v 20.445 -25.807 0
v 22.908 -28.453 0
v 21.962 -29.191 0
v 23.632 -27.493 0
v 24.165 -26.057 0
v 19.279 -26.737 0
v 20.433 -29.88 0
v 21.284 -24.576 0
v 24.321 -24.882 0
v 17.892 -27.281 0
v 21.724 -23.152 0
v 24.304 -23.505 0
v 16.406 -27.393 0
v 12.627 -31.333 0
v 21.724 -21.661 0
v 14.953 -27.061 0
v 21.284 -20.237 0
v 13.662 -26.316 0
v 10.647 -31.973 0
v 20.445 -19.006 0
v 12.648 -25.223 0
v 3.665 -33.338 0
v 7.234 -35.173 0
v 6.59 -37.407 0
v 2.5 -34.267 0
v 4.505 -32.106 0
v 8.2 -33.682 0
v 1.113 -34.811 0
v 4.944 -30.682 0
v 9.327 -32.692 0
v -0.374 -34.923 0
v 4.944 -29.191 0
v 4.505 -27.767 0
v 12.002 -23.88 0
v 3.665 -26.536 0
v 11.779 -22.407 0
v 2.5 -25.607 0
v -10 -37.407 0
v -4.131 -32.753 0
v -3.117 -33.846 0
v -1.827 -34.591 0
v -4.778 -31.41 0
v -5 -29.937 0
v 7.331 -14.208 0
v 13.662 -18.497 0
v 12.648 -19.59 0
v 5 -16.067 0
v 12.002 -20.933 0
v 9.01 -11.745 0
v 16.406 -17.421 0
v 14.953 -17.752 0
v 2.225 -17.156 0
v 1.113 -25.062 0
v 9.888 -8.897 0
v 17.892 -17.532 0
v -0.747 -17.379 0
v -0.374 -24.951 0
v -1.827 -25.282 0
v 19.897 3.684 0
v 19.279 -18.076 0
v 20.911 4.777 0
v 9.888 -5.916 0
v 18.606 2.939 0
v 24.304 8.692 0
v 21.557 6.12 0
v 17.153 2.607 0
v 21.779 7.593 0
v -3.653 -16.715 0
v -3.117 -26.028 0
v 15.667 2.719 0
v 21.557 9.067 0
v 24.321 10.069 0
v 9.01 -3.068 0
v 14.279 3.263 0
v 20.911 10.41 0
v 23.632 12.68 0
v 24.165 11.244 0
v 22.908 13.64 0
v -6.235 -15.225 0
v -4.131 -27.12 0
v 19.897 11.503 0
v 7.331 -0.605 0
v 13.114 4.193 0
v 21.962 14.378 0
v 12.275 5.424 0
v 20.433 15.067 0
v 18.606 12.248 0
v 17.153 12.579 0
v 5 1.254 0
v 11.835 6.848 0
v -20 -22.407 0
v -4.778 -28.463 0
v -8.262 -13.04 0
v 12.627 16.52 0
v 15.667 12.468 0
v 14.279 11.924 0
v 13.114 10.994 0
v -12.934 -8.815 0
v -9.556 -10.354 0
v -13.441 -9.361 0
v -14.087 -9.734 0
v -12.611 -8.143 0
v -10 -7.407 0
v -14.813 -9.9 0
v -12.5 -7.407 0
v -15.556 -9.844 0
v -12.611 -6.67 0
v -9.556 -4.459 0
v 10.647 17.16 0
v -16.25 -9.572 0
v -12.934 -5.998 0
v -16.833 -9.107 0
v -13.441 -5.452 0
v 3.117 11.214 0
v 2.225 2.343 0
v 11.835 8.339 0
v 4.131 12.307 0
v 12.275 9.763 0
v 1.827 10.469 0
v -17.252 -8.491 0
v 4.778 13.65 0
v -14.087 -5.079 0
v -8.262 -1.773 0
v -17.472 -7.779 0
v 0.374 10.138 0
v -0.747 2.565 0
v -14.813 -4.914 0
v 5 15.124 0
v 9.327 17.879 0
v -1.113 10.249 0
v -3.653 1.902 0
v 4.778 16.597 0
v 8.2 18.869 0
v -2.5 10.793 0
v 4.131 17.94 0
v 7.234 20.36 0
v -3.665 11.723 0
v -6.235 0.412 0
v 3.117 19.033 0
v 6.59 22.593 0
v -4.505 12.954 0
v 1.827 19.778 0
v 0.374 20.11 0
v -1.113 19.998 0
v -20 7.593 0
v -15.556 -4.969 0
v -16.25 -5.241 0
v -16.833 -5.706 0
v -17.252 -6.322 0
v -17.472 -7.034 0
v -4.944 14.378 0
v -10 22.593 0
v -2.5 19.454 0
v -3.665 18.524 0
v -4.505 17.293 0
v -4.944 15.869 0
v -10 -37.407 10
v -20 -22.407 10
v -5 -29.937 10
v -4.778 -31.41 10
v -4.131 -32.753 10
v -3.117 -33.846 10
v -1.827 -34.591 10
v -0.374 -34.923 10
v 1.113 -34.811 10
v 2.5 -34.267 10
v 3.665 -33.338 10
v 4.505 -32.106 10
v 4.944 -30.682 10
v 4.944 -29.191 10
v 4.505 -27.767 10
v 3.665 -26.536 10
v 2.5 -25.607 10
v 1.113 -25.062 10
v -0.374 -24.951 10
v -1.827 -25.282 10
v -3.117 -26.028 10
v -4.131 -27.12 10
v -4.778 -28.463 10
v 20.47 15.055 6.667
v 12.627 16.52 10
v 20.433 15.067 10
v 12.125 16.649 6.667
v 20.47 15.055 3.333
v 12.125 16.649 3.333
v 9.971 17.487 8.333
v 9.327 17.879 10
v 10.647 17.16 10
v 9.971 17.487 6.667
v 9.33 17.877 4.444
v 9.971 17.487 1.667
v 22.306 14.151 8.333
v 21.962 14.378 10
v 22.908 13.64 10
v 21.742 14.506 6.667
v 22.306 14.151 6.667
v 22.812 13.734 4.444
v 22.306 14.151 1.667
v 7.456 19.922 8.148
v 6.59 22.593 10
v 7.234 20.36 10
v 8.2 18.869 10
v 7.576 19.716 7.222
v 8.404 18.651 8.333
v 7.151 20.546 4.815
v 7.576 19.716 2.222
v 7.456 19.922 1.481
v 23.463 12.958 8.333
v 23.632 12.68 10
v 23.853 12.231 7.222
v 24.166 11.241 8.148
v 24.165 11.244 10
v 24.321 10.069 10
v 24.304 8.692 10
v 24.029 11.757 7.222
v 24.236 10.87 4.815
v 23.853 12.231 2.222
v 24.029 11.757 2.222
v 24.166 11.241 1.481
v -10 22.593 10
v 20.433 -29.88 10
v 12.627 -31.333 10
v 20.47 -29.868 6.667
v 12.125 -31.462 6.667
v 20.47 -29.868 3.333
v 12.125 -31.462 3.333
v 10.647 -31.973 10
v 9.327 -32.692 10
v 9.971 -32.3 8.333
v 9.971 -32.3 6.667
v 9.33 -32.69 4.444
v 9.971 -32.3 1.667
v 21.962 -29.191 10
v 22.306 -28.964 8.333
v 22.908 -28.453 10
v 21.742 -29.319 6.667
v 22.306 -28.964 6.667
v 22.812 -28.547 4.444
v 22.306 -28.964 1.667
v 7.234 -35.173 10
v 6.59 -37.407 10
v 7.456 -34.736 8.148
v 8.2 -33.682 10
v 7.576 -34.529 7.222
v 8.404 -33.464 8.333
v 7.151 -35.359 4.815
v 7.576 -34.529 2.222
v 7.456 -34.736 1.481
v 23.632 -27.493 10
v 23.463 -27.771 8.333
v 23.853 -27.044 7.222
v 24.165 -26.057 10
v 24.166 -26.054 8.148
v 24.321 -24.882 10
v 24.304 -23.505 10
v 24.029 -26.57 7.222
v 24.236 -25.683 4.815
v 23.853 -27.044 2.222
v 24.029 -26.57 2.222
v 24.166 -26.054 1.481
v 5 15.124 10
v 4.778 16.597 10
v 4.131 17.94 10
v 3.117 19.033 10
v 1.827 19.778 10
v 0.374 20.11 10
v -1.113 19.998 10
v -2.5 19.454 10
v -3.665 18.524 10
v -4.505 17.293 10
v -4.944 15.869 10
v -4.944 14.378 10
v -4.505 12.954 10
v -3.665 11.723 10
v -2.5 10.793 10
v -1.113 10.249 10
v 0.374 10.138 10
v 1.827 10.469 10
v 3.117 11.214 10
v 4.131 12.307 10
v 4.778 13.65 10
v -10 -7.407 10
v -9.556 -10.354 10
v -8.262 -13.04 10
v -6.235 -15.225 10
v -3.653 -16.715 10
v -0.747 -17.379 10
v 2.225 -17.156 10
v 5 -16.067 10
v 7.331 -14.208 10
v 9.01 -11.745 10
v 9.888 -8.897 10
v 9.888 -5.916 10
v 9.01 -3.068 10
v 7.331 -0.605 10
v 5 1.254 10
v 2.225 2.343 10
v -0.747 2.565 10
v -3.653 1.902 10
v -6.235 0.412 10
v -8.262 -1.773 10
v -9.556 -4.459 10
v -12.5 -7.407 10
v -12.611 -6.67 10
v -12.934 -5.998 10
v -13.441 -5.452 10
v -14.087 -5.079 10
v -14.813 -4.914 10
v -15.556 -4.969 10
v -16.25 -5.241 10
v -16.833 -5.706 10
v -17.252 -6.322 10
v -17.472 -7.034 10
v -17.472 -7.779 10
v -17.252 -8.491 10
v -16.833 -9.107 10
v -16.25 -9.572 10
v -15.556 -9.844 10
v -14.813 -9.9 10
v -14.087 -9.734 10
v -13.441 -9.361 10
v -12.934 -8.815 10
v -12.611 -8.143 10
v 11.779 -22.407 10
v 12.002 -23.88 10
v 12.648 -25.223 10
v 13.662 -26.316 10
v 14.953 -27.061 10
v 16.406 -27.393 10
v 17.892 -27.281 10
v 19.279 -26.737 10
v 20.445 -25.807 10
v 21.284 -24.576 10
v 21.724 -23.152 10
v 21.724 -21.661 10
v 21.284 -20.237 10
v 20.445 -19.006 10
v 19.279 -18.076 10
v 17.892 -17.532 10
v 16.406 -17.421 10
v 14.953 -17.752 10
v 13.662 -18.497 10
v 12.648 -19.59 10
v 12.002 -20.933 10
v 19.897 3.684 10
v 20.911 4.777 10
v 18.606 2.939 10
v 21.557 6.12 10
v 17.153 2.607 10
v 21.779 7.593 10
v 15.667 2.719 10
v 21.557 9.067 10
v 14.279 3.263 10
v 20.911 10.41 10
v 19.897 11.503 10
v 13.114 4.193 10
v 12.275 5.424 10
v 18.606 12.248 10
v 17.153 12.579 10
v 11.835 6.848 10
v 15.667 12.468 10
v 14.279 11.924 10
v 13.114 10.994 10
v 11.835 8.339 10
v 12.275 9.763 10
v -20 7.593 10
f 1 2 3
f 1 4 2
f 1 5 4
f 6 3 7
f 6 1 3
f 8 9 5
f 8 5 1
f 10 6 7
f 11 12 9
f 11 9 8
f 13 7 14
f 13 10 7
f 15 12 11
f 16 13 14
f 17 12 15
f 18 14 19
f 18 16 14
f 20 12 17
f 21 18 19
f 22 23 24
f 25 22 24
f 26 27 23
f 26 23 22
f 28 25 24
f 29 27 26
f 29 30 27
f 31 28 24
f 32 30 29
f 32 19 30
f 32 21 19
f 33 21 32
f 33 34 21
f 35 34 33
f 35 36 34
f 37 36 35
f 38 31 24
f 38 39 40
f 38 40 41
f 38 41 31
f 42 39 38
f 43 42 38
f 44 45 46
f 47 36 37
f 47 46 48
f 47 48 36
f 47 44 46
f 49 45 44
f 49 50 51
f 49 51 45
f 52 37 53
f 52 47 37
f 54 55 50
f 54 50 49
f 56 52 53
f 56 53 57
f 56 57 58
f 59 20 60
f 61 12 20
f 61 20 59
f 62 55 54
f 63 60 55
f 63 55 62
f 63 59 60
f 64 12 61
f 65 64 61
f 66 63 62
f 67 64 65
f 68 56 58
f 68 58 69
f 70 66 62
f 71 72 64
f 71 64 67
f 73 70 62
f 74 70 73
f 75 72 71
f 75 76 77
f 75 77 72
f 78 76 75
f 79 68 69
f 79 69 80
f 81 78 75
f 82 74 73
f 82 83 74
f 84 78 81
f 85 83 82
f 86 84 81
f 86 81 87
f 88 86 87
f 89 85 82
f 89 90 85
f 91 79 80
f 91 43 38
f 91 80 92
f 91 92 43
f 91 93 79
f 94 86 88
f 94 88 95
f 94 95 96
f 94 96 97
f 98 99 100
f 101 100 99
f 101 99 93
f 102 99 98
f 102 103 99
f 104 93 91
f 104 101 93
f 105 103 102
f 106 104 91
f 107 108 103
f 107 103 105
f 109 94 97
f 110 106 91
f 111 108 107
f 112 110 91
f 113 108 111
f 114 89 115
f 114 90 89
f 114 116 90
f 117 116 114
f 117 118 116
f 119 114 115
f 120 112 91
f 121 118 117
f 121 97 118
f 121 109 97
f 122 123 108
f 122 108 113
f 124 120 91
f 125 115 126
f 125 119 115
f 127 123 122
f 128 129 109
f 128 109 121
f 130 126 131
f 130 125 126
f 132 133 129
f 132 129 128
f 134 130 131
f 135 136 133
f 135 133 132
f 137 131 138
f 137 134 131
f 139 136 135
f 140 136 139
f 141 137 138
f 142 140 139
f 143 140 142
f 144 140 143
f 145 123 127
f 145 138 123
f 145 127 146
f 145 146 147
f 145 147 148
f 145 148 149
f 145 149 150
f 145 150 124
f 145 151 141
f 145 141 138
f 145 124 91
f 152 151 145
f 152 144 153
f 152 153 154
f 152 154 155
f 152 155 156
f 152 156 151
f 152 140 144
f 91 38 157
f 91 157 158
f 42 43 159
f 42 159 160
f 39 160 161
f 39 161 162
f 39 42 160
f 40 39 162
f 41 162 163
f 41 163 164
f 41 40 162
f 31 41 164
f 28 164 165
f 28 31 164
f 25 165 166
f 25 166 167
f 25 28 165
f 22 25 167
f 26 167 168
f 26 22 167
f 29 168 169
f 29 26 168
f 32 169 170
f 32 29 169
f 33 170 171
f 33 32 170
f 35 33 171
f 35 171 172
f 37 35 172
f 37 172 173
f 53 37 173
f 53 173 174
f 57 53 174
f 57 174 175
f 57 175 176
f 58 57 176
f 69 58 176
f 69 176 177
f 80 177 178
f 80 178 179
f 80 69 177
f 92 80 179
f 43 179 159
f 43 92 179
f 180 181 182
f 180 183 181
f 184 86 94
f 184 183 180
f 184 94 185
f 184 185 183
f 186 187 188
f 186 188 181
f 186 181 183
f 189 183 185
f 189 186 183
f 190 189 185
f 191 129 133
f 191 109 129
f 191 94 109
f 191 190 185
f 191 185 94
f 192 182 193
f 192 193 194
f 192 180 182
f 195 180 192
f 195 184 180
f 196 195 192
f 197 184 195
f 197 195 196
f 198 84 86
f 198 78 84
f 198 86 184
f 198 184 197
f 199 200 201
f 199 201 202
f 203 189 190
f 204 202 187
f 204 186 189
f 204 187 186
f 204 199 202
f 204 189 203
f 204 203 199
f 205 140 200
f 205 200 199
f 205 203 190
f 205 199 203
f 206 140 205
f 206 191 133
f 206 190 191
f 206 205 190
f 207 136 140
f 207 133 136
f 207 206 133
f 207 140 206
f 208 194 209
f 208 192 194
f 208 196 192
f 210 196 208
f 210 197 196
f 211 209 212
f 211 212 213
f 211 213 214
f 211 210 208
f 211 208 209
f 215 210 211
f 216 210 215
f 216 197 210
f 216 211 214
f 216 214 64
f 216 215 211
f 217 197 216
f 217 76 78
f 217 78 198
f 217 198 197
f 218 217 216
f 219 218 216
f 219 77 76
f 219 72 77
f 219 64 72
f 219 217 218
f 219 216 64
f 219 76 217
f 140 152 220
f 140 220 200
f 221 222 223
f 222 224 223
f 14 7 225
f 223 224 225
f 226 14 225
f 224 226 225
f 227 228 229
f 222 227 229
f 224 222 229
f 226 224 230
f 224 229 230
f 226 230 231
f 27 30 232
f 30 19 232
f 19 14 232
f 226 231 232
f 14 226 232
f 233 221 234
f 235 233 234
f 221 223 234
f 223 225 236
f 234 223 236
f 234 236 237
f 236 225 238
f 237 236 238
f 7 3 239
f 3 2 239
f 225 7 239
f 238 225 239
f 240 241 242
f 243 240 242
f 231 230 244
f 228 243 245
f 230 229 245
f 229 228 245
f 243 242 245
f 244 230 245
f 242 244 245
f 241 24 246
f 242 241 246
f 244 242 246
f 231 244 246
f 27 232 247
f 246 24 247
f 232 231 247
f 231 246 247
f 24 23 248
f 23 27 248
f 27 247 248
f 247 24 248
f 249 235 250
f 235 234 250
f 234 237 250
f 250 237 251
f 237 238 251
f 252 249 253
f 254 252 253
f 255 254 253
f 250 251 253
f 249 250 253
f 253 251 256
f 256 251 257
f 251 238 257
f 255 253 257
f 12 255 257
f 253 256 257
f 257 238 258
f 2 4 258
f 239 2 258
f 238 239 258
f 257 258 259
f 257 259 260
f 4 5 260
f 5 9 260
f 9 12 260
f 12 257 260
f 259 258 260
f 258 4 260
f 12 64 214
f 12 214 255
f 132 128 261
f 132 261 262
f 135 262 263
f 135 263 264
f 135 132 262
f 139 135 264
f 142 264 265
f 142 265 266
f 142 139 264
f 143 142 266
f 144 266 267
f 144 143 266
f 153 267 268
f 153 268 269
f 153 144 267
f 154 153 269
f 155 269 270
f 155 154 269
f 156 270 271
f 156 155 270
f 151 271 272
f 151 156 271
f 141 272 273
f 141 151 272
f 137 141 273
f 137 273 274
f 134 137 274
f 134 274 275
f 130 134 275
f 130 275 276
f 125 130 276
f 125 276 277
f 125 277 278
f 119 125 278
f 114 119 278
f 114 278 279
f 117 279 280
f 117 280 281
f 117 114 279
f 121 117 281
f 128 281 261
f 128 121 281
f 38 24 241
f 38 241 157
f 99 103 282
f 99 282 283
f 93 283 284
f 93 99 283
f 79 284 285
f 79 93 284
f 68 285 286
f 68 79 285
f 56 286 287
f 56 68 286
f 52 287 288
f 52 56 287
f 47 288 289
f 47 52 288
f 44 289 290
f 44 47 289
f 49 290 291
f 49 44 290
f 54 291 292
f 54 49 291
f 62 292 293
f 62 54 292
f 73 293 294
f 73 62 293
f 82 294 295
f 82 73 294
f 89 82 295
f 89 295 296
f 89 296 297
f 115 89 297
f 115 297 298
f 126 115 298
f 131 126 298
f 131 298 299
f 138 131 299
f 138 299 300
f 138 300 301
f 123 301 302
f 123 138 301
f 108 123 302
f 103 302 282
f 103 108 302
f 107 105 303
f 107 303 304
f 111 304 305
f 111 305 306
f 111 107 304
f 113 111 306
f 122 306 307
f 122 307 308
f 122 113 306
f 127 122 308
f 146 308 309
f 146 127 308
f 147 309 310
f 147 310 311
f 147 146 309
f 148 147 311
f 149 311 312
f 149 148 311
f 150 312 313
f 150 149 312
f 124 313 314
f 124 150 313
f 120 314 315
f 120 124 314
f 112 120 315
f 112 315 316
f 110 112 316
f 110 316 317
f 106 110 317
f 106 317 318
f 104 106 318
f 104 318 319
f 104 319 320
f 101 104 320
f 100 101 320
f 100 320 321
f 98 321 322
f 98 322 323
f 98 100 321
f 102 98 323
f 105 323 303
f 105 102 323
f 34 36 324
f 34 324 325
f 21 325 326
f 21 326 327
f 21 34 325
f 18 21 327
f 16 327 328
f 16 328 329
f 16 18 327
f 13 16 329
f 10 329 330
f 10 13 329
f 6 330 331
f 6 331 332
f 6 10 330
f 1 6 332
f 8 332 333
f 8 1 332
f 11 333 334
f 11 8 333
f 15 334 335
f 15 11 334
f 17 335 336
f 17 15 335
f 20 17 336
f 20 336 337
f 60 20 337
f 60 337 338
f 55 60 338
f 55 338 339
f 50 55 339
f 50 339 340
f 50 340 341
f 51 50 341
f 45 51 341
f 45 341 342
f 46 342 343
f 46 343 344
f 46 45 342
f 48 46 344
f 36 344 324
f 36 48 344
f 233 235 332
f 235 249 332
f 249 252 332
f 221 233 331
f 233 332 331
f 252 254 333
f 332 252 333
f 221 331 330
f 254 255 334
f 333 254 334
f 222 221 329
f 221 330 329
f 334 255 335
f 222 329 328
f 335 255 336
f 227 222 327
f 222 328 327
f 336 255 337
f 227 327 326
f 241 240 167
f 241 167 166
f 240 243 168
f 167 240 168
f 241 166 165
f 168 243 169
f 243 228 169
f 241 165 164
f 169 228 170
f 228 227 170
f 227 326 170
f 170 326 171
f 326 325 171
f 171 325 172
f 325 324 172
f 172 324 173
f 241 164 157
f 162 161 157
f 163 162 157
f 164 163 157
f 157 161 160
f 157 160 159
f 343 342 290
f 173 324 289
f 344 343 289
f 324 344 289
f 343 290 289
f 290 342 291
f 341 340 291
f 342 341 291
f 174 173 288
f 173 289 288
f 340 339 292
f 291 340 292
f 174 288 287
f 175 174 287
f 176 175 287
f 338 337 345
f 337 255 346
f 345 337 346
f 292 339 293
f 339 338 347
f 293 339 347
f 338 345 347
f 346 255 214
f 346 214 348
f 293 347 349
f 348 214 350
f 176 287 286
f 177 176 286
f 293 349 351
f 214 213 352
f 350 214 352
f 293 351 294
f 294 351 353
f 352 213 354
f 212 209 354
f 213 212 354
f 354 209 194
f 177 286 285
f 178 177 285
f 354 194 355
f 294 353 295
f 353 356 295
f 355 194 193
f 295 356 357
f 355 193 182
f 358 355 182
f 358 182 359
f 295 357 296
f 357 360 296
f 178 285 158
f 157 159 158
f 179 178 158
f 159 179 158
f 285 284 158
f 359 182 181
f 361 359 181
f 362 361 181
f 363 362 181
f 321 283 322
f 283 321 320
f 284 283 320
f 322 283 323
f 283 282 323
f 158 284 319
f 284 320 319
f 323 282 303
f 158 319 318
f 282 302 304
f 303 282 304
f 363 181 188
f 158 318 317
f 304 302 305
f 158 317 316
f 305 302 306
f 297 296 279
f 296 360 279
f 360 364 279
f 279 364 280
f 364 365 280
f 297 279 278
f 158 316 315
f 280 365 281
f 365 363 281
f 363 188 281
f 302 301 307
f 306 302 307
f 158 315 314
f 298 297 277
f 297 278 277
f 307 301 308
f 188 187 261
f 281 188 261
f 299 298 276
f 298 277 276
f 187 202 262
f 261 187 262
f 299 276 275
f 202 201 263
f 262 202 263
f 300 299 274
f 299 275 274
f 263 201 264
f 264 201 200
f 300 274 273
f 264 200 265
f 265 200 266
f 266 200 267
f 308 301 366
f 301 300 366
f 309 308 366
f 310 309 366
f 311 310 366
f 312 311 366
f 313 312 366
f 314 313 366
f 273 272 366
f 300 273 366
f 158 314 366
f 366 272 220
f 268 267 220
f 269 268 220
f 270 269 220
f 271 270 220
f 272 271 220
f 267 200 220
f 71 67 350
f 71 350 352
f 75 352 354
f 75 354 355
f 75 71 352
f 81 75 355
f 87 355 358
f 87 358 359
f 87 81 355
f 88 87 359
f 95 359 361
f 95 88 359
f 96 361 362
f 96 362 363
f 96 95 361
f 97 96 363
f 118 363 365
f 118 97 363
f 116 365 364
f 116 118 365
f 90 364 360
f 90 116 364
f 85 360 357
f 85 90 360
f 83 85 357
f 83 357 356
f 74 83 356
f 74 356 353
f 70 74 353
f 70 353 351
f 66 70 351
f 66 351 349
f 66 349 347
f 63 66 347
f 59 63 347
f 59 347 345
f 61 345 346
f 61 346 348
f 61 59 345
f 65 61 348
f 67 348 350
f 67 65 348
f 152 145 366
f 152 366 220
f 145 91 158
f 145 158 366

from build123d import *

# Parameters (mm, degrees)
SKETCH1_R           = 10
SKETCH1_R_2         = 2.5
SKETCH1_R_3         = 5
BOSS_EXTRUDE1_DEPTH = 10


with BuildPart() as part:
    # Sketch1 → Boss-Extrude1 (new body)
    with BuildSketch(Plane.XY):
        with BuildLine():
            Line((-20, -22.406552459), (-20, 7.593447541))
            Line((-20, 7.593447541), (-10, 22.593447541))
            Line((-10, 22.593447541), (0, 22.593447541))
            Line((0, 22.593447541), (6.589653899, 22.593447541))
            add(Edge.make_bspline(
                [(6.589653899, 22.593447541), (8.279830639, 11.435624487), (25.165546695, 20.477646142), (24.304134066, 8.692145069)],
                knots=[0, 0, 0, 0, 1, 1, 1, 1], degree=3))
            Line((24.304134066, 8.692145069), (24.304134066, -23.505249987))
            add(Edge.make_bspline(
                [(6.589653899, -37.406552459), (8.279830639, -26.248729405), (25.165546695, -35.290751061), (24.304134066, -23.505249987)],
                knots=[0, 0, 0, 0, 1, 1, 1, 1], degree=3))
            Line((6.589653899, -37.406552459), (0, -37.406552459))
            Line((0, -37.406552459), (-10, -37.406552459))
            Line((-10, -37.406552459), (-20, -22.406552459))
        make_face()
        with Locations(Location((0, -7.406552459, 0), (0, 0, 180))):
            Circle(SKETCH1_R, mode=Mode.SUBTRACT)
        with Locations((-15, -7.406552459)):
            Circle(SKETCH1_R_2, mode=Mode.SUBTRACT)
        with Locations((0, 15.12355642)):
            Circle(SKETCH1_R_3, mode=Mode.SUBTRACT)
        with Locations((16.779399128, 7.593447541)):
            Circle(SKETCH1_R_3, mode=Mode.SUBTRACT)
        with Locations(Location((0, -29.936661338, 0), (0, 0, 180))):
            Circle(SKETCH1_R_3, mode=Mode.SUBTRACT)
        with Locations(Location((16.779399128, -22.406552459, 0), (0, 0, 180))):
            Circle(SKETCH1_R_3, mode=Mode.SUBTRACT)
    extrude(amount=BOSS_EXTRUDE1_DEPTH)


solid = part.part
